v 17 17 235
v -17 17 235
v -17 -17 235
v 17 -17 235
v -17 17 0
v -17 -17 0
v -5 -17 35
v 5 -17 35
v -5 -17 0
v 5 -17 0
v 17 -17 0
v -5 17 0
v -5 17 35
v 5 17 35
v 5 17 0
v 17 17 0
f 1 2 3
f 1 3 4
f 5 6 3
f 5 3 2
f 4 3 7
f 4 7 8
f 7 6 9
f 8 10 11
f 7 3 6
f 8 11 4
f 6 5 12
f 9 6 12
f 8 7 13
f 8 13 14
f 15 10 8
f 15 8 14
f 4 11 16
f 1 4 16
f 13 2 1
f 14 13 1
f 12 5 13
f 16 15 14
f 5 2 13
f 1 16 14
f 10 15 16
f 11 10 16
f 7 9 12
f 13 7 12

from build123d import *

# Parameters (mm, degrees)
SKETCH_W     = 34
SKETCH_H     = 34
PAD_DEPTH    = 235
SKETCH001_W  = 10
SKETCH001_H  = 34
POCKET_DEPTH = 35


with BuildPart() as part:
    # Sketch → Pad (new body)
    with BuildSketch(Plane.XY):
        Rectangle(SKETCH_W, SKETCH_H)
    extrude(amount=PAD_DEPTH)

    # Sketch001 → Pocket (cut)
    with BuildSketch(Plane.XY):
        Rectangle(SKETCH001_W, SKETCH001_H)
    extrude(amount=POCKET_DEPTH, mode=Mode.SUBTRACT)


solid = part.part
